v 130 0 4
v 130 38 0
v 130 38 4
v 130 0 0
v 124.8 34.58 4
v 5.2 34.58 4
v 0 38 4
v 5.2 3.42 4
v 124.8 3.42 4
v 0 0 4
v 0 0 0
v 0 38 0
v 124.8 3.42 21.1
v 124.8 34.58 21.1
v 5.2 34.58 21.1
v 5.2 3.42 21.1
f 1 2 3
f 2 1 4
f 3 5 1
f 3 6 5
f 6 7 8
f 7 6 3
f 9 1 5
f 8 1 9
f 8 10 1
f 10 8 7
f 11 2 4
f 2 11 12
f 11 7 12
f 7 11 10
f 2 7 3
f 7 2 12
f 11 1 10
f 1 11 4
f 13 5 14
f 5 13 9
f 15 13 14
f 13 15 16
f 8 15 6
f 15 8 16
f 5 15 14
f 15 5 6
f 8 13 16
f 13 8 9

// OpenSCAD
// Editable baseline for the documented x=2/128 mm simple-support and
// 100 N center-load proxy. Replace the low solid block with a connected,
// high-I longitudinal load path while preserving support and load patches.
base_size = [130, 38, 4];
starter_block_size = [119.6, 31.16, 17.1];

union() {
    cube(base_size);
    translate([5.2, 3.42, 4]) cube(starter_block_size);
}
